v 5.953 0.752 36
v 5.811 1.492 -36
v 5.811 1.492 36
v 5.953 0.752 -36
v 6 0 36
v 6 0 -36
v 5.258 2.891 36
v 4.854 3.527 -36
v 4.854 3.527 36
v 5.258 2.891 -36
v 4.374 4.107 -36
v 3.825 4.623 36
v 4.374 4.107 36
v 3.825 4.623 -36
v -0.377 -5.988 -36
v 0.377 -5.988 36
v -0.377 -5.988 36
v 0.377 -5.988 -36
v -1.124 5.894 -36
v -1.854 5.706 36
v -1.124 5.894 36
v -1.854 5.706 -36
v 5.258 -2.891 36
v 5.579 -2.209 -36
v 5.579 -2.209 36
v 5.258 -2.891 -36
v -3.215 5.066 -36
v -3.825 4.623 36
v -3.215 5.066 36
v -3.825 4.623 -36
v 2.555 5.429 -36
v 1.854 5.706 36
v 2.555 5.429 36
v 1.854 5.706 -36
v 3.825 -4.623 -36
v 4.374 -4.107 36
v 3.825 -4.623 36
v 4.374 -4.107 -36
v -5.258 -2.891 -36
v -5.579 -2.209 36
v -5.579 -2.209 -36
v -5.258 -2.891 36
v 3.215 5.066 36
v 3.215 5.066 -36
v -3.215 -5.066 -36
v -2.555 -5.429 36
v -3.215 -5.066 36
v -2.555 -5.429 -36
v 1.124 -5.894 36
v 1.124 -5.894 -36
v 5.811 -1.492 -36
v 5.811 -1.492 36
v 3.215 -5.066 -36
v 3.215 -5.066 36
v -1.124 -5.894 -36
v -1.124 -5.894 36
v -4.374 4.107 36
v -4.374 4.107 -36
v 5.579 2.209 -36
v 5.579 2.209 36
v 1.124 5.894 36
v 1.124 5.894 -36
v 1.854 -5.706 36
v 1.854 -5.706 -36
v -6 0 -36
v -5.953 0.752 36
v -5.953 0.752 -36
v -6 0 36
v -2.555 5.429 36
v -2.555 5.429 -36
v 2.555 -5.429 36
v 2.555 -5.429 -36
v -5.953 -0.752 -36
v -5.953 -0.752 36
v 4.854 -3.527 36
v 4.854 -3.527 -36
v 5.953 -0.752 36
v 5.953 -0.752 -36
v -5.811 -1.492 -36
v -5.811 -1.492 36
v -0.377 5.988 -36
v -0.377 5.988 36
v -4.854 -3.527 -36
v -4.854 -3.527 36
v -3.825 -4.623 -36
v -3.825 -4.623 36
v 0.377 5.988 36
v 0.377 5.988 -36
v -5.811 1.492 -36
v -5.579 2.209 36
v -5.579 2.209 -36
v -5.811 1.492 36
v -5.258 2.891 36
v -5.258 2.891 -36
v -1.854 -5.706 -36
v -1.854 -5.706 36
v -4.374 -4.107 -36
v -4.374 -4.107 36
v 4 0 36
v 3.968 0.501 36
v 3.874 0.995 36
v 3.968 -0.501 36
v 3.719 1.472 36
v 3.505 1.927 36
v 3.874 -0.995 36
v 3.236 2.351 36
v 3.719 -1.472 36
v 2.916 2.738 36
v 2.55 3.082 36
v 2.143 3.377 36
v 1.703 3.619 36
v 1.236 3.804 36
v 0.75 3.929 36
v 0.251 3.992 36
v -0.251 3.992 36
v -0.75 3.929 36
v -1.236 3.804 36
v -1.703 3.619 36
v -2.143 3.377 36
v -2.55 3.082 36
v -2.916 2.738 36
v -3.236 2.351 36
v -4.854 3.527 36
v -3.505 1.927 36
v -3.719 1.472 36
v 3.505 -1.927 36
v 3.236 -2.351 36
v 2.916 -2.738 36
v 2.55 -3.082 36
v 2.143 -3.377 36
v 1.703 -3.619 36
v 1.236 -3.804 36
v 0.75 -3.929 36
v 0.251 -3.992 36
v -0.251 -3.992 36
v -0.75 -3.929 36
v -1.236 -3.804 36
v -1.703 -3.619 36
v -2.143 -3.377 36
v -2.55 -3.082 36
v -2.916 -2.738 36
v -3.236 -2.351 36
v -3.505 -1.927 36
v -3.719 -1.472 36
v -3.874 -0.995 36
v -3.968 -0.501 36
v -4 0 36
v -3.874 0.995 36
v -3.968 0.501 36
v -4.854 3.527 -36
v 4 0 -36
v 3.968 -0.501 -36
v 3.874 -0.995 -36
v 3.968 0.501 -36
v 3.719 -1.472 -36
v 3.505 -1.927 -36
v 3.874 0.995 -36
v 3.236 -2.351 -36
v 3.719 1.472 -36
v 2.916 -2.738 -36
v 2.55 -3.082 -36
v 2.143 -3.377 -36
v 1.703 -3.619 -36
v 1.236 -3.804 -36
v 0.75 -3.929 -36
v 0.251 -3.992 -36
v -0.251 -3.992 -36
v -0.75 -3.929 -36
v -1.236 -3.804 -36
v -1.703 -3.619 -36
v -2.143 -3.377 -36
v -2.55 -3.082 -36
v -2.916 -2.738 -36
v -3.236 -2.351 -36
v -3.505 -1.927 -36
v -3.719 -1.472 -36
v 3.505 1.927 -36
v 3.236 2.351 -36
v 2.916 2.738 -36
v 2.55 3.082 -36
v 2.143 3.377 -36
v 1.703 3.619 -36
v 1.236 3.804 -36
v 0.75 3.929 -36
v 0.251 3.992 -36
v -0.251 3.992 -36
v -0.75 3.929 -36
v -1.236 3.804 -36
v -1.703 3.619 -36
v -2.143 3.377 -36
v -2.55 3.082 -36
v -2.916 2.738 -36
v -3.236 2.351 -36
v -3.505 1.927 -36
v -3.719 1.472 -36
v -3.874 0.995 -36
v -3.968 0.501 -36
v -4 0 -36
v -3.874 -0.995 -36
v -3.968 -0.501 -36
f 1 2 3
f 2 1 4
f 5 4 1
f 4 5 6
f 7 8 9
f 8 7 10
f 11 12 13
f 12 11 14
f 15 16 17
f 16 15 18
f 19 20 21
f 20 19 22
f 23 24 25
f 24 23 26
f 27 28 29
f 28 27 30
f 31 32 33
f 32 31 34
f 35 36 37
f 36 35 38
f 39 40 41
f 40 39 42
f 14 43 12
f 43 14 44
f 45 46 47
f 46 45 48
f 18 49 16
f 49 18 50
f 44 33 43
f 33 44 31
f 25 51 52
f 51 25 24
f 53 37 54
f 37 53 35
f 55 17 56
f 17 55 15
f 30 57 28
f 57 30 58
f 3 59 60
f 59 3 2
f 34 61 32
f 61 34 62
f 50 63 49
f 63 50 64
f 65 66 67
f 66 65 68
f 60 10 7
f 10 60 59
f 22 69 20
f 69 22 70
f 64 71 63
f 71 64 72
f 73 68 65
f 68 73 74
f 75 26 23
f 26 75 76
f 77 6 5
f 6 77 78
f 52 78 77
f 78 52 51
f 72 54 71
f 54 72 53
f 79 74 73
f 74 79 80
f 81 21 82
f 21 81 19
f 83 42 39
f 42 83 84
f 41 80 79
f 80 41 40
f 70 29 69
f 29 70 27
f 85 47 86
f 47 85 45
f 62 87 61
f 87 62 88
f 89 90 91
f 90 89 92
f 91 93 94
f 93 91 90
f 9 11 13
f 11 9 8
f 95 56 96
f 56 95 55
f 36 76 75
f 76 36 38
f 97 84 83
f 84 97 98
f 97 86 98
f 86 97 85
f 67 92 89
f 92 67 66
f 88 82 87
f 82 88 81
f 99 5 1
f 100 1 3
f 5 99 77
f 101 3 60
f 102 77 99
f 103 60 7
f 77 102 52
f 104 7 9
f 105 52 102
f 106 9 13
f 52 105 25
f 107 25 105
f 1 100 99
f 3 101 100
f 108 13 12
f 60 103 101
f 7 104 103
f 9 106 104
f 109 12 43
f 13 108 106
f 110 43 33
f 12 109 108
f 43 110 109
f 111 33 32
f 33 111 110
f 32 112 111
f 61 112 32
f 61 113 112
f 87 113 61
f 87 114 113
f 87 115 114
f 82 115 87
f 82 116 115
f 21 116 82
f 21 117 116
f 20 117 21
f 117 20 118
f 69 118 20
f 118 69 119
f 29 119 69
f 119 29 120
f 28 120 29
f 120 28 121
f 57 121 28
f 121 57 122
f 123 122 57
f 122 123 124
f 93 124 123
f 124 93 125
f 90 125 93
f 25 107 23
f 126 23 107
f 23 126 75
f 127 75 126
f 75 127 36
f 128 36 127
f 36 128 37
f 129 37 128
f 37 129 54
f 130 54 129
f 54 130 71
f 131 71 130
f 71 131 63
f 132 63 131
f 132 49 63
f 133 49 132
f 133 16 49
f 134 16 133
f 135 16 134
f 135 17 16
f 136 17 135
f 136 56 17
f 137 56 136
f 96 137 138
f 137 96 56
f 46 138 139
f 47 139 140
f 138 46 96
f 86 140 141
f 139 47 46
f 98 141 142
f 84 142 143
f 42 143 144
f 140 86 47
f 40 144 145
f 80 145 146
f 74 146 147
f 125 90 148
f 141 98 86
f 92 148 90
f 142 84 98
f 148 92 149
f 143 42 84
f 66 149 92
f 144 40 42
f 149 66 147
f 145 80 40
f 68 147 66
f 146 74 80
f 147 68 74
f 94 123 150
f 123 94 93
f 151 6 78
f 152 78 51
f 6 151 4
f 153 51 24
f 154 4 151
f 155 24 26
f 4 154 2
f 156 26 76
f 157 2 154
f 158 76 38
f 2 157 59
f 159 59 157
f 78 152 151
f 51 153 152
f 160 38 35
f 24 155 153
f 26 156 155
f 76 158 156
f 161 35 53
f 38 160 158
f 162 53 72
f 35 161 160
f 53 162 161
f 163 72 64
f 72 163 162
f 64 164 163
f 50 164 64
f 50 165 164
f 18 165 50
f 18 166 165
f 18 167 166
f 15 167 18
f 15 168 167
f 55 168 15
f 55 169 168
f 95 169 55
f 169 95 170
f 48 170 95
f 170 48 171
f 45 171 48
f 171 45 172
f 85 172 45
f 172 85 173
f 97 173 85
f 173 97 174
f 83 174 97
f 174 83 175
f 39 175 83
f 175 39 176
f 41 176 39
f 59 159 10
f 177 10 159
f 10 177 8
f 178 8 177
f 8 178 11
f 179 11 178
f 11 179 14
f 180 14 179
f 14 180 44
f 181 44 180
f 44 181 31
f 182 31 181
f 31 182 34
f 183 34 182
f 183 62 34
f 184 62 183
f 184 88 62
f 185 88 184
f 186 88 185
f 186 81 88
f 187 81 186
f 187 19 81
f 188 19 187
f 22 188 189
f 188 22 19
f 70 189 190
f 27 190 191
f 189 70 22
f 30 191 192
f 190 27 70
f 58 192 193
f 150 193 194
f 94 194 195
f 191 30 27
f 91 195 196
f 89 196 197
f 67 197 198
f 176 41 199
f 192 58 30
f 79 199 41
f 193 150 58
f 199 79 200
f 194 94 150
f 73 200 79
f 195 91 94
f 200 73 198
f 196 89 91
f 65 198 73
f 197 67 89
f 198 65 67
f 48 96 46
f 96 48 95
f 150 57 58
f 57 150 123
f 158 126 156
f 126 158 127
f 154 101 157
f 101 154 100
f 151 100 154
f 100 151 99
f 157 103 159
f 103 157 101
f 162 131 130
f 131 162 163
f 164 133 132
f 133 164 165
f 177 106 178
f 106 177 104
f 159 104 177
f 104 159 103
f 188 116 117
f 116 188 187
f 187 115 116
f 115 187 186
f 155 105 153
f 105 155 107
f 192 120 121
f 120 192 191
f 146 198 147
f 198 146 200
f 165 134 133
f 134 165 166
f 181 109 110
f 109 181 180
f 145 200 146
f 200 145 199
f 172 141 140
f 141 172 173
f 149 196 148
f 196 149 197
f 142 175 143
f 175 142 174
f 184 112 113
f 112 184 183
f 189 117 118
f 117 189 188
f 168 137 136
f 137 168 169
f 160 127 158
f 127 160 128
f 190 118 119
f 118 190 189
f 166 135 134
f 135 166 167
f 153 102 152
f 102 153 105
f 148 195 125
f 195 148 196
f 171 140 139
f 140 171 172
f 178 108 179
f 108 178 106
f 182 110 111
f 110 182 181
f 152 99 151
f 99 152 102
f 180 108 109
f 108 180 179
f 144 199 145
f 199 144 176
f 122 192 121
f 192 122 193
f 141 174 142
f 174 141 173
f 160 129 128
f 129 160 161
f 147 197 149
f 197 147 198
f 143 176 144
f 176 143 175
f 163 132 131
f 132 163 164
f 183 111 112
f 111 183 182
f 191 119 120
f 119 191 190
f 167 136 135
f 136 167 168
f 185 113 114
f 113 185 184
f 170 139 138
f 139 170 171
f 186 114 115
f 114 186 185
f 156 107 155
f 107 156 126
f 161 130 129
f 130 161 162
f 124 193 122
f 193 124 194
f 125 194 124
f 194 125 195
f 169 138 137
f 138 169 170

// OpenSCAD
$fn = 50;


difference() {
	union() {
		translate(v = [0, 0, -36.0000000000]) {
			cylinder(h = 72, r = 6.0000000000);
		}
	}
	union() {
		translate(v = [0, 0, -100.0000000000]) {
			cylinder(h = 200, r = 4.0000000000);
		}
	}
}
